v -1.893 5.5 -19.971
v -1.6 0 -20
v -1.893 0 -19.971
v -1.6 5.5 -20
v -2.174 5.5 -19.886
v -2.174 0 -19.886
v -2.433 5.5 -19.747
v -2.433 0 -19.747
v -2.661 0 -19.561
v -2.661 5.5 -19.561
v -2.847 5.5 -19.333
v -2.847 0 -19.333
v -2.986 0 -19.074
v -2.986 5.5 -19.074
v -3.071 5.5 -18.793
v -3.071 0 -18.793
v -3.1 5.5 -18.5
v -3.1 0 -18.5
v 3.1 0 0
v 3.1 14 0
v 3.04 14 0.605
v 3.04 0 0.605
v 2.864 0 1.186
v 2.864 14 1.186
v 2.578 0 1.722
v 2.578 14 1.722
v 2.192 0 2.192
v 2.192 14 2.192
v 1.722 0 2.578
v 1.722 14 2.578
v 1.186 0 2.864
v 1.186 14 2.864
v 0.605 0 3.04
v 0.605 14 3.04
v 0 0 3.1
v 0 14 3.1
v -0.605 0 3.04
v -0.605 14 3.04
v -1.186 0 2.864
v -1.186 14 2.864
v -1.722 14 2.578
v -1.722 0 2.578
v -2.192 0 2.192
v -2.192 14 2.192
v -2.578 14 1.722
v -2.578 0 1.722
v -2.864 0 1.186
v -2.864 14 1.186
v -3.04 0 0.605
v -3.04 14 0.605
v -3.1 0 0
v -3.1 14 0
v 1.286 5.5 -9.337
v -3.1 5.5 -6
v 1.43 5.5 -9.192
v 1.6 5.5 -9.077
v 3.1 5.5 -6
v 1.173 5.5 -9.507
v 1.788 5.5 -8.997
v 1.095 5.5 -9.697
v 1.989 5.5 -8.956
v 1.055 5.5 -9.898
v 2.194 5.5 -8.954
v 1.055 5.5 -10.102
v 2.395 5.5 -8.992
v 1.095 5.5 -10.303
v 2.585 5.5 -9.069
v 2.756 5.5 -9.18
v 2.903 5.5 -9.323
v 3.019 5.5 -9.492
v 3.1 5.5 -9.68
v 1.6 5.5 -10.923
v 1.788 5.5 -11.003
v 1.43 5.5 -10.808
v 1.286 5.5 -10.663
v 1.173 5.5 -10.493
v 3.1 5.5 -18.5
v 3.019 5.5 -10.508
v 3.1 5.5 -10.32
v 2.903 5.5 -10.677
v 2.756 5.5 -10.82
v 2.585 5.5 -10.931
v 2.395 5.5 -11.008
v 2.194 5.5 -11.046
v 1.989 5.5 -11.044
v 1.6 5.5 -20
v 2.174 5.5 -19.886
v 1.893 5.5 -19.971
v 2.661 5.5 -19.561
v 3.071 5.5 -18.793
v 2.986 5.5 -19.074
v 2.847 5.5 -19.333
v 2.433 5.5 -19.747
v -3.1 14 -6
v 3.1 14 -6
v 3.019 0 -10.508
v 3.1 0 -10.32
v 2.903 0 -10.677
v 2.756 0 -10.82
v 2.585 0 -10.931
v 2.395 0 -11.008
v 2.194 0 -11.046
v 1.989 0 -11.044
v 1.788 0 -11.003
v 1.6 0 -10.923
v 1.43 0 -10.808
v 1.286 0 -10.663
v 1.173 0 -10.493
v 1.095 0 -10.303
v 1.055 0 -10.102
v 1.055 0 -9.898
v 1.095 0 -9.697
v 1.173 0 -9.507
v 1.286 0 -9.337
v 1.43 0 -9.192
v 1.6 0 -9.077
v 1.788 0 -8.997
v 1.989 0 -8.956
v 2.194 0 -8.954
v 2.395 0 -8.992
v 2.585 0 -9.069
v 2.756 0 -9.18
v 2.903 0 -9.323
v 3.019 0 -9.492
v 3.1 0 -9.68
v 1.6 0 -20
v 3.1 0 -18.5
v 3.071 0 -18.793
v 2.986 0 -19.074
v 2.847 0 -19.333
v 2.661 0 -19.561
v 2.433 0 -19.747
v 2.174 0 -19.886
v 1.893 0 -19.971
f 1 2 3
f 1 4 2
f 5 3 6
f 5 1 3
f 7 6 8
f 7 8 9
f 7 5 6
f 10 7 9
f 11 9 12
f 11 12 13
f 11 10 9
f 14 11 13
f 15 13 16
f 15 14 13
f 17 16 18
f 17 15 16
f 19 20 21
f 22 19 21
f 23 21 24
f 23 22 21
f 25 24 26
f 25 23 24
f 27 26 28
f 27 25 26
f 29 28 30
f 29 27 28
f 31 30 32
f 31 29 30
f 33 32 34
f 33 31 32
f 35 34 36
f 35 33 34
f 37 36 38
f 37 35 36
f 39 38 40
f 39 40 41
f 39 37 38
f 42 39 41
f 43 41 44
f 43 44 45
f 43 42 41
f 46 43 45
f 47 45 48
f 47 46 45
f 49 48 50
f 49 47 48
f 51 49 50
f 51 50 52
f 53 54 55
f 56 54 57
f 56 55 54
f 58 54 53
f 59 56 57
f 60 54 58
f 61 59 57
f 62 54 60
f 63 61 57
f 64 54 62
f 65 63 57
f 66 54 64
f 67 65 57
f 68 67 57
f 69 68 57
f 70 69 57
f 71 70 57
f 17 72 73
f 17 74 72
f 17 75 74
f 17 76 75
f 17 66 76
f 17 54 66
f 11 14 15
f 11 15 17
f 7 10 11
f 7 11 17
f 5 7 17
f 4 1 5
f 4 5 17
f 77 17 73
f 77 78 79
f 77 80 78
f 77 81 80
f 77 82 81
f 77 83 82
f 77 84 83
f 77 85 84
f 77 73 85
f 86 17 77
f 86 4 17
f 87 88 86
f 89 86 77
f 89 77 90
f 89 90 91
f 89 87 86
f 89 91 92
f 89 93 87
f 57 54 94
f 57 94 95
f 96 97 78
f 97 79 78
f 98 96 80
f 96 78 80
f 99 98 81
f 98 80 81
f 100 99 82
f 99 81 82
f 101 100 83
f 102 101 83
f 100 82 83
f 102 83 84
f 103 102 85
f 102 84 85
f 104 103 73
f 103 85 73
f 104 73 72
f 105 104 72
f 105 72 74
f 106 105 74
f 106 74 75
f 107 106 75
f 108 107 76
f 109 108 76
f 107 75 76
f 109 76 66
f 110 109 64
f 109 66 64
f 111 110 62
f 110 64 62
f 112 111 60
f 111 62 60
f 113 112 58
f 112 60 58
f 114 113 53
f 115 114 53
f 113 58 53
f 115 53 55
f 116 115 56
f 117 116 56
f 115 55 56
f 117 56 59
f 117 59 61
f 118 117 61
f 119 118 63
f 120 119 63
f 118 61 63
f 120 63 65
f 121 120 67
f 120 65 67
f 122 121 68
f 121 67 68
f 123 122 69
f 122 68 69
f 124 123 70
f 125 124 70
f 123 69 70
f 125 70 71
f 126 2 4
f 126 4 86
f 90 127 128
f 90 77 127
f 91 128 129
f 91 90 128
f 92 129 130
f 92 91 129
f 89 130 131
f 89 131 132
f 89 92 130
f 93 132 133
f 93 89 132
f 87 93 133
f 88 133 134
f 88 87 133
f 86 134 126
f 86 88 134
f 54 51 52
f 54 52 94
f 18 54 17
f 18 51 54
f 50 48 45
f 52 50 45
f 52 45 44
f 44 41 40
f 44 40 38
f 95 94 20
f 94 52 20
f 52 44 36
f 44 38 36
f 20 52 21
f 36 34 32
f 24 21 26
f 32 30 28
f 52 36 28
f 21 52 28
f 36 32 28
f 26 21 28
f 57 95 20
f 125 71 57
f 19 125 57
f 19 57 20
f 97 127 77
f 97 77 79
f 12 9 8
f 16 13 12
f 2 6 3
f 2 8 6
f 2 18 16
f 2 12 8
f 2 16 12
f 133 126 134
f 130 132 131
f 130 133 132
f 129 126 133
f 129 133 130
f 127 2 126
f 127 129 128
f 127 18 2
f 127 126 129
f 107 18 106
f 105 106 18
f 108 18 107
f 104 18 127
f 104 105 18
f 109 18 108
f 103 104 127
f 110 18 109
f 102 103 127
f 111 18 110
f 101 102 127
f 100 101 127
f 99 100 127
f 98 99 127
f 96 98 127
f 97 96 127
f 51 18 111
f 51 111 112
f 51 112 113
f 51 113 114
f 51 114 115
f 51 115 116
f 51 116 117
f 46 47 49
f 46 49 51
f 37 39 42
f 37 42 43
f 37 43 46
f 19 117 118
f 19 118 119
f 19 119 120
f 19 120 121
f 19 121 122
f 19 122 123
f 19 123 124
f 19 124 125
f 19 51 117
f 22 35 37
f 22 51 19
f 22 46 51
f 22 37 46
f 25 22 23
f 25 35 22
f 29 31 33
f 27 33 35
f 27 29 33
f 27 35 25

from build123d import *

# Parameters (mm, degrees)
F1_DEPTH = 14
F2_W     = 6.2
F2_H     = 8.5
F3_DEPTH = 14
F6_D     = 2.1
F7_R     = 1.5


with BuildPart() as f1:
    # F0 (on Front) → F1 (new body)
    with BuildSketch(Plane.XZ):
        with BuildLine():
            Line((3.1, -20), (3.1, 0))
            ThreePointArc((3.1, 0), (0, 3.1), (-3.1, 0))
            Line((-3.1, 0), (-3.1, -20))
            Line((-3.1, -20), (3.1, -20))
        make_face()
    extrude(amount=-F1_DEPTH)

    # F2 (on face) → F3 (cut)
    with BuildSketch(Plane(origin=(0, 0, -20), x_dir=(1, 0, 0), z_dir=(0, 0, -1))):
        with Locations((0, -9.75)):
            Rectangle(F2_W, F2_H)
    extrude(amount=-F3_DEPTH, mode=Mode.SUBTRACT)

    # F6 (through all)
    with Locations(Plane.XZ.offset(5)):
        with Locations((2.1, -10)):
            Hole(F6_D / 2)

    # F7
    f7_edges = [f1.edges().sort_by_distance(p)[0] for p in [
        (3.1, 2.75, -20),
        (-3.1, 2.75, -20),
    ]]
    fillet(f7_edges, radius=F7_R)


solid = f1.part
